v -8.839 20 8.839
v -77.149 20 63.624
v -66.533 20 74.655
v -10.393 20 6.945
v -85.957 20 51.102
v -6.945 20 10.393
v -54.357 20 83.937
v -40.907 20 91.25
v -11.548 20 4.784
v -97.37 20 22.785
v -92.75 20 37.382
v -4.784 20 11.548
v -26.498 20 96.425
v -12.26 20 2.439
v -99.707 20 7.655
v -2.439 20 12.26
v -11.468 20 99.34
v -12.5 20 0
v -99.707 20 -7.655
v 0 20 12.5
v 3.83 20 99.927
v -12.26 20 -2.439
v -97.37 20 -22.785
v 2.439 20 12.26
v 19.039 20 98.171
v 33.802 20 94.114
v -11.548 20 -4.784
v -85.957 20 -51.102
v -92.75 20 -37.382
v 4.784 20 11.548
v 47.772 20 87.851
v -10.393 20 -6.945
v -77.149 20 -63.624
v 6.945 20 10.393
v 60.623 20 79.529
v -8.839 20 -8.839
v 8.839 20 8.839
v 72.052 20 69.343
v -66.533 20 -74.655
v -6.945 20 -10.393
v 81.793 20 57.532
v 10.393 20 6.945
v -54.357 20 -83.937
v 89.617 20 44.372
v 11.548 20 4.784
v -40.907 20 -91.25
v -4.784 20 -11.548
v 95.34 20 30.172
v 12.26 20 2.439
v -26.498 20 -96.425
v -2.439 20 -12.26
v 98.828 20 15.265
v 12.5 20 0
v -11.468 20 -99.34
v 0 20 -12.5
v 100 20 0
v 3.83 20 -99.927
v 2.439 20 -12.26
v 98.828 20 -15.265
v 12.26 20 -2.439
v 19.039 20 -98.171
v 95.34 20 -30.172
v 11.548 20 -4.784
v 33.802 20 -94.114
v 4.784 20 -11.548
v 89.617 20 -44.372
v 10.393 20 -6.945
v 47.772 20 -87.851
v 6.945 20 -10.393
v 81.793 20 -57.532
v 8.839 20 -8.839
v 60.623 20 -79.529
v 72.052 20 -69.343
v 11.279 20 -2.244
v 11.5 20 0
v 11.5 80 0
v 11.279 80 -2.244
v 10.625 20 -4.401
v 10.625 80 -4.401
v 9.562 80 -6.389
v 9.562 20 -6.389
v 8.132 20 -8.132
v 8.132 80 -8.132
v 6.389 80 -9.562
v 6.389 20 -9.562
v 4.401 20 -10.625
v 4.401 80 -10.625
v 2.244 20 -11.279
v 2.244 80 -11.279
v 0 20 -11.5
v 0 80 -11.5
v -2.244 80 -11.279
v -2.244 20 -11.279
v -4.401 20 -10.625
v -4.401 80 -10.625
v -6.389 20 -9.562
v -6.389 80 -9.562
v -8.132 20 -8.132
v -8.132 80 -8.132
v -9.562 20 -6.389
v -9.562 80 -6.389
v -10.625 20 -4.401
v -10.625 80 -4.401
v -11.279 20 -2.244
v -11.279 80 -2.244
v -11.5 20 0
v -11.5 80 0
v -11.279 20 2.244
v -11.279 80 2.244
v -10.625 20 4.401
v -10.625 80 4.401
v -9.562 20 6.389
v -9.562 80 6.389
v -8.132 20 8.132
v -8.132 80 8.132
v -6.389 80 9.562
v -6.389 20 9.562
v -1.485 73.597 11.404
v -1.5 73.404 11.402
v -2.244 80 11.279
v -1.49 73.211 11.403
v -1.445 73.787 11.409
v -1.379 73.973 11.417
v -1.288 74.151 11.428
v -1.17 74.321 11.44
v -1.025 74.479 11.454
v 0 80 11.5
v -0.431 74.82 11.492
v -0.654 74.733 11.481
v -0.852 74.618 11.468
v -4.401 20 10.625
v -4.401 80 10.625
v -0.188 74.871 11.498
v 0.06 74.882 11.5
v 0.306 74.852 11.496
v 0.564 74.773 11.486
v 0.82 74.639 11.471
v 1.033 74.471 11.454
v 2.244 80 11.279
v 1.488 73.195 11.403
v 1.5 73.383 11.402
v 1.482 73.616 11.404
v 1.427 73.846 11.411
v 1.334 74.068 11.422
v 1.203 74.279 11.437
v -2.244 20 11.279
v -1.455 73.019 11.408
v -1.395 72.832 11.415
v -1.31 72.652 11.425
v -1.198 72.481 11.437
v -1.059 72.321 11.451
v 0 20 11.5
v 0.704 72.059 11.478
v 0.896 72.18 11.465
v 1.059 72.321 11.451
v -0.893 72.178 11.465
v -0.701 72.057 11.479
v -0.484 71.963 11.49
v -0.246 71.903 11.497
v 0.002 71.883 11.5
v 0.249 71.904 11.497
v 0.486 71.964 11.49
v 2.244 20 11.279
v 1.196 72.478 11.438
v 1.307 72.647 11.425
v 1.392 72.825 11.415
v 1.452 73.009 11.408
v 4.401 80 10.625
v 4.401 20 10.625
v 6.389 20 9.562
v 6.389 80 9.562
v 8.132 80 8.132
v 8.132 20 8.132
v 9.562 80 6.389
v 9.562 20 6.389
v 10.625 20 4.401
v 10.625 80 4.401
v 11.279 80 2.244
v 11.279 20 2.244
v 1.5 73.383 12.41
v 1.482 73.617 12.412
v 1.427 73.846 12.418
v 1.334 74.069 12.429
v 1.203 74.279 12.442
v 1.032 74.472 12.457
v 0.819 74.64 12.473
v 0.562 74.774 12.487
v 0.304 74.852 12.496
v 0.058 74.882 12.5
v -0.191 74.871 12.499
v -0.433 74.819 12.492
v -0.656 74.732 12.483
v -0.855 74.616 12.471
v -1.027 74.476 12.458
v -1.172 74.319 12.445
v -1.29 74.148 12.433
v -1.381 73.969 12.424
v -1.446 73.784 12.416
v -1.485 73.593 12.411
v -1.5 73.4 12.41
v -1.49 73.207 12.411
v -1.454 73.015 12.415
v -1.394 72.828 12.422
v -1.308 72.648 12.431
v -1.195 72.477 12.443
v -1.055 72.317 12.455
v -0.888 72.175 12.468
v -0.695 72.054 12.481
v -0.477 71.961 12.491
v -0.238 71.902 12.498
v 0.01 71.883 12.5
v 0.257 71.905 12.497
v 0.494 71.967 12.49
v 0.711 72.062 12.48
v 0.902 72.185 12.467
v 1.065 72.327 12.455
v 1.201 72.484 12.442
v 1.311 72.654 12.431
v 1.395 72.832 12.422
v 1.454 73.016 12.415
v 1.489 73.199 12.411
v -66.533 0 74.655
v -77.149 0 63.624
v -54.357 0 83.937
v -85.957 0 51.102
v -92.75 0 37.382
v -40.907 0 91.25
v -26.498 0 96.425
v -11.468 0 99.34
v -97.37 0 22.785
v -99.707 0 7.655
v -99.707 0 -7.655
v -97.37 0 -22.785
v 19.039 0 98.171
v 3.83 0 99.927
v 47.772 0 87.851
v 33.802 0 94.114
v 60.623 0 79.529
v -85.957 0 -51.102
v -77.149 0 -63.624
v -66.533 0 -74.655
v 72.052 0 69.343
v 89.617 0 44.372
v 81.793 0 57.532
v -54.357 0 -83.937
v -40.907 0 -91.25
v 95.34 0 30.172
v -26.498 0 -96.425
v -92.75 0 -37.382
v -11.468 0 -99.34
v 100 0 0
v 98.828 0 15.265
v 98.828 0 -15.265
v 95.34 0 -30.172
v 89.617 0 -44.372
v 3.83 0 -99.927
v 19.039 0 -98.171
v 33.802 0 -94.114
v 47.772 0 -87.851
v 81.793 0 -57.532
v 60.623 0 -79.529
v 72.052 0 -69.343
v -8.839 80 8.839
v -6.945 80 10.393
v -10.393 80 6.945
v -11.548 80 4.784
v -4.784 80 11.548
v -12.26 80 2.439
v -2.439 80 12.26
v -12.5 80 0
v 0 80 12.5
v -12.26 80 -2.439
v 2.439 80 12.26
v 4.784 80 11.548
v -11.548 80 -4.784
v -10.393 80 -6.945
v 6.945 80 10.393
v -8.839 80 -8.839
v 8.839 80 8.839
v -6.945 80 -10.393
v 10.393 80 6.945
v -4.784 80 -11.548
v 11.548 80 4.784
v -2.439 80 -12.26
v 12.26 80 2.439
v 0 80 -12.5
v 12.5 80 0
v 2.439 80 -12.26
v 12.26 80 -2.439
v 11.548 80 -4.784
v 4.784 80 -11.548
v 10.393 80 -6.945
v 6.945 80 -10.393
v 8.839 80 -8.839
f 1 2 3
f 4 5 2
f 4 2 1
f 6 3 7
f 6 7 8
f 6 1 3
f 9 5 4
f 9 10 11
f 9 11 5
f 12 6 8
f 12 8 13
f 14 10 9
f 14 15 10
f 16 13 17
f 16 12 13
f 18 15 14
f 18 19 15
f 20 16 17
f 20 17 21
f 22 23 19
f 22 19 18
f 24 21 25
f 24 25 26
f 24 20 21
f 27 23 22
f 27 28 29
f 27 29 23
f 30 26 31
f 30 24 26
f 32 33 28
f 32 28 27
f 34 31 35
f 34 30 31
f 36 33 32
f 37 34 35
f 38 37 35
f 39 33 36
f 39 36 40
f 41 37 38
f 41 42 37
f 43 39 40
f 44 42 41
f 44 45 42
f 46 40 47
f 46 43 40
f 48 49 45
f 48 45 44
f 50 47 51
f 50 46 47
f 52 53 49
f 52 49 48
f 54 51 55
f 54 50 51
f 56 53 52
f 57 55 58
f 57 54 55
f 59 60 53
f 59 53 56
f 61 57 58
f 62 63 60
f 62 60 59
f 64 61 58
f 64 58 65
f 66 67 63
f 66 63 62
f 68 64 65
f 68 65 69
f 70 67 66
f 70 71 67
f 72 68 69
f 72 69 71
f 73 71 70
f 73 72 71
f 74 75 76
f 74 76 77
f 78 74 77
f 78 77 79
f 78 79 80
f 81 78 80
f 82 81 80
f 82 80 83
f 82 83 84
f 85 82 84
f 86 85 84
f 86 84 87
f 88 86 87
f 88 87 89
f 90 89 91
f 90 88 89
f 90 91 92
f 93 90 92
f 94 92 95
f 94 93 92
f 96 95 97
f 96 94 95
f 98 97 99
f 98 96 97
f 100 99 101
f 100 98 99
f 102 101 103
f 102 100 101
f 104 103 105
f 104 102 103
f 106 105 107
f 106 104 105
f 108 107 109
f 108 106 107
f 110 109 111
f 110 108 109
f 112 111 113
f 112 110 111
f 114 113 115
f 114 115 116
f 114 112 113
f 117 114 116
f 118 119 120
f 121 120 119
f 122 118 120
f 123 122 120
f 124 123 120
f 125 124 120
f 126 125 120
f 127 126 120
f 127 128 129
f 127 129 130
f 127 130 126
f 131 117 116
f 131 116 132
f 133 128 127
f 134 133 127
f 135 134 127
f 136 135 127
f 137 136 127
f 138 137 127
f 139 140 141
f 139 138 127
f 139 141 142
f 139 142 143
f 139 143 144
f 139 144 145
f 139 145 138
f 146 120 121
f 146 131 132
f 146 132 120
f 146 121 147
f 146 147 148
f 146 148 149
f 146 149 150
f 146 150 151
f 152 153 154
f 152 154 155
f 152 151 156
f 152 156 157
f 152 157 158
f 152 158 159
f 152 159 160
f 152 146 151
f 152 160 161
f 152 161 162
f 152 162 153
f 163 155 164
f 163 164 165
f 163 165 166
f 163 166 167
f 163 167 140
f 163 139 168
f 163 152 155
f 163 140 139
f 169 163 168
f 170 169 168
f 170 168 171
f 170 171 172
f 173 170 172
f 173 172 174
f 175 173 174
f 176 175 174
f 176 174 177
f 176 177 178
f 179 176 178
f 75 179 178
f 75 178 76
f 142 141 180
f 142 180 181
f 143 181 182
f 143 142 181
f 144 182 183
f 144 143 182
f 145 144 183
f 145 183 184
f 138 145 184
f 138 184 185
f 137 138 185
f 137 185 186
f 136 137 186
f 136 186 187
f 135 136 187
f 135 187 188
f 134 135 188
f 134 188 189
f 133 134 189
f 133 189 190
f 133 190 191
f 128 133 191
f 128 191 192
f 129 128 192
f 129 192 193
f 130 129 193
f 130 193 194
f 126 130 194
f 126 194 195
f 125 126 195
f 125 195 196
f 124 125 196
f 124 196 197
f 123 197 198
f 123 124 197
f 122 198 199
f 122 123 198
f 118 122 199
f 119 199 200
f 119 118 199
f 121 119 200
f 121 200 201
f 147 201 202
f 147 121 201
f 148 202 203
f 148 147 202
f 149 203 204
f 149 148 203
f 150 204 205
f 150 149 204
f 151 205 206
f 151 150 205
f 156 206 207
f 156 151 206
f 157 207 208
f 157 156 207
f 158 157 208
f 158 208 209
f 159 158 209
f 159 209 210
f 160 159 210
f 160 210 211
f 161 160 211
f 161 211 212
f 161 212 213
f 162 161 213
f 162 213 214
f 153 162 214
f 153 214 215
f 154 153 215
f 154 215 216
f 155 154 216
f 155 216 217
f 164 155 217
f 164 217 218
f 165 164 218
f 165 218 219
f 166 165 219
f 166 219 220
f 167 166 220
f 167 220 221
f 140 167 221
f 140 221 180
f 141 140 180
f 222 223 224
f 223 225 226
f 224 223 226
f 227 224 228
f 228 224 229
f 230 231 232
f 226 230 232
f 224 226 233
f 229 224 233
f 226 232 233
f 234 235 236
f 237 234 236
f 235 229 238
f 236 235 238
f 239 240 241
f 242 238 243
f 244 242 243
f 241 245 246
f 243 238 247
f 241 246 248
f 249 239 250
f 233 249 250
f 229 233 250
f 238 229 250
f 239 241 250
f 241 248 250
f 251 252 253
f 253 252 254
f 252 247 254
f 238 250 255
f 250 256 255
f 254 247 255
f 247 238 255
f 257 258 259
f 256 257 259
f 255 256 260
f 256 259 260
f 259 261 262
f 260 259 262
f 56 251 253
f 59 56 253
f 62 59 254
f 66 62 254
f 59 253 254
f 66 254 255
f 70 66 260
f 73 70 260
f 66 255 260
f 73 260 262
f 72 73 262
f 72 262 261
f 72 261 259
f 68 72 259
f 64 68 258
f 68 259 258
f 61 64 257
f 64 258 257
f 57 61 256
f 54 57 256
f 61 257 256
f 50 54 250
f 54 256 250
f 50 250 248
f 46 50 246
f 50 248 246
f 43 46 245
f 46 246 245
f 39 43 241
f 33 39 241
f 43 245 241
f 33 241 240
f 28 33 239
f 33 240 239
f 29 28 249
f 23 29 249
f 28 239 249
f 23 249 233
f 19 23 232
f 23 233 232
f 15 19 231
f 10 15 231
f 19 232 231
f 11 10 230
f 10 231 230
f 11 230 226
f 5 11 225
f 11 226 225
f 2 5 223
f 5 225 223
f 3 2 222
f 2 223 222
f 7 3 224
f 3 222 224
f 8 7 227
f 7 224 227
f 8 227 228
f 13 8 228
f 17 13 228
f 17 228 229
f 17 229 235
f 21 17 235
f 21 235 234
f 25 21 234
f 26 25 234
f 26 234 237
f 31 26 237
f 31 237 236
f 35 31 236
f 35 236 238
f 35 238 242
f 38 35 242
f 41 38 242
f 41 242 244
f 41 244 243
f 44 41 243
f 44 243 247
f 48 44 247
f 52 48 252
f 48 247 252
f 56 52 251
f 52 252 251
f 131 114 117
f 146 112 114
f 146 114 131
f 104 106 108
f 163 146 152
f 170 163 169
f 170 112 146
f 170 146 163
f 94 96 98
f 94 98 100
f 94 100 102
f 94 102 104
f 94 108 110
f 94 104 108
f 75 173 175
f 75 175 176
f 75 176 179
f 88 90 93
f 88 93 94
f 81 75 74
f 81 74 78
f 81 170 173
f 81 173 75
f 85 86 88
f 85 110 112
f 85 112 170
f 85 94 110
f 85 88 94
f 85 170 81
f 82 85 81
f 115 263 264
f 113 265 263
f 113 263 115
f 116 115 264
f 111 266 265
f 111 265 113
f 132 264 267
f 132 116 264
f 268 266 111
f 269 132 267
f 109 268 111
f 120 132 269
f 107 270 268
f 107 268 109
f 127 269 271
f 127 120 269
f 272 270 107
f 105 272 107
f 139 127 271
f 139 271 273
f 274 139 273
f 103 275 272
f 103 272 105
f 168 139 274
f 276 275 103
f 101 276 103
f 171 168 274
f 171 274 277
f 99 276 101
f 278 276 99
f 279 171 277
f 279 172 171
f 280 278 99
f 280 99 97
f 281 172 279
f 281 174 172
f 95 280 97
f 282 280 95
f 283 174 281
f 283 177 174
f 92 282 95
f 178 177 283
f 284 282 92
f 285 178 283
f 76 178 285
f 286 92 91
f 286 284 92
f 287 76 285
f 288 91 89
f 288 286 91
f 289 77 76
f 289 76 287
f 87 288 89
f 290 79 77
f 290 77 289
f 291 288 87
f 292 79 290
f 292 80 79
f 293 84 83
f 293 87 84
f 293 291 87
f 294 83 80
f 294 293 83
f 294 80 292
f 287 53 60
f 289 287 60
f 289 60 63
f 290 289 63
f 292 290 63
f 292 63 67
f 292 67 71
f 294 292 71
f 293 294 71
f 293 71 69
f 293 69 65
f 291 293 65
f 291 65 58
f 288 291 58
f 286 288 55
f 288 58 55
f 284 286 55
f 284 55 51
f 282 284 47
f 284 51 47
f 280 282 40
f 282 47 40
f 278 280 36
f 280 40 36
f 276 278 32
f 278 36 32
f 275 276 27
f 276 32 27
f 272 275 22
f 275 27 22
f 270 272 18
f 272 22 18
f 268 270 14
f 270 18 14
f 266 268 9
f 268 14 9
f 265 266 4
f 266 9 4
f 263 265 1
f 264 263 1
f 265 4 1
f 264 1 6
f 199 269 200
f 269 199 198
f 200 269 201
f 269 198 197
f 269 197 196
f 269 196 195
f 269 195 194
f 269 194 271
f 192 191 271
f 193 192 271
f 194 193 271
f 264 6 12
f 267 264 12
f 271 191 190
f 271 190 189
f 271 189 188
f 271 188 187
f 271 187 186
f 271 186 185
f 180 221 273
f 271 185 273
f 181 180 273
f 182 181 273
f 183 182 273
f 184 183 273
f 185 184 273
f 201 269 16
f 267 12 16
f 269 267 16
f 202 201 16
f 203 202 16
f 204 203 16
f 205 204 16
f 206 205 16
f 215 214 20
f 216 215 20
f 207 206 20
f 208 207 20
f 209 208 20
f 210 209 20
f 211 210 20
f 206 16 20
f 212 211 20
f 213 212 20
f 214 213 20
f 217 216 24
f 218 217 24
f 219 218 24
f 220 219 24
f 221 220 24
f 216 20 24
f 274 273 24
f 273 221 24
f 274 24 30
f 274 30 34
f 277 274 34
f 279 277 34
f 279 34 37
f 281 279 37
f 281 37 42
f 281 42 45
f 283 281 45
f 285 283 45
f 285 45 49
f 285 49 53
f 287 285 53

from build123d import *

# Parameters (mm, degrees)
SKETCH1_R           = 100
BOSS_EXTRUDE1_DEPTH = 20
SKETCH2_R           = 12.5
SKETCH2_R_2         = 11.5
BOSS_EXTRUDE2_DEPTH = 60
CUT_EXTRUDE1_REACH  = 102
SKETCH3_R           = 1.5


with BuildPart() as part:
    # Sketch1 → Boss-Extrude1 (new body)
    with BuildSketch(Plane(origin=(0, 0, 0), x_dir=(1, 0, 0), z_dir=(0, 1, 0))):
        Circle(SKETCH1_R)
    extrude(amount=BOSS_EXTRUDE1_DEPTH)

    # Sketch2 → Boss-Extrude2 (add)
    with BuildSketch(Plane(origin=(0, 20, 0), x_dir=(1, 0, 0), z_dir=(0, 1, 0))):
        Circle(SKETCH2_R)
        Circle(SKETCH2_R_2, mode=Mode.SUBTRACT)
    extrude(amount=BOSS_EXTRUDE2_DEPTH)

    # Sketch3 → Cut-Extrude1 (cut, up to next)
    with BuildSketch(Plane.XY, mode=Mode.PRIVATE) as cut_extrude1_sk1:
        with Locations((0, 73.383174369)):
            Circle(SKETCH3_R)
    cut_extrude1_tool1 = extrude(cut_extrude1_sk1.sketch, amount=CUT_EXTRUDE1_REACH, mode=Mode.PRIVATE) & part.part
    add(cut_extrude1_tool1.solids().sort_by_distance((0, 73.383174, 0))[0], mode=Mode.SUBTRACT)


solid = part.part
